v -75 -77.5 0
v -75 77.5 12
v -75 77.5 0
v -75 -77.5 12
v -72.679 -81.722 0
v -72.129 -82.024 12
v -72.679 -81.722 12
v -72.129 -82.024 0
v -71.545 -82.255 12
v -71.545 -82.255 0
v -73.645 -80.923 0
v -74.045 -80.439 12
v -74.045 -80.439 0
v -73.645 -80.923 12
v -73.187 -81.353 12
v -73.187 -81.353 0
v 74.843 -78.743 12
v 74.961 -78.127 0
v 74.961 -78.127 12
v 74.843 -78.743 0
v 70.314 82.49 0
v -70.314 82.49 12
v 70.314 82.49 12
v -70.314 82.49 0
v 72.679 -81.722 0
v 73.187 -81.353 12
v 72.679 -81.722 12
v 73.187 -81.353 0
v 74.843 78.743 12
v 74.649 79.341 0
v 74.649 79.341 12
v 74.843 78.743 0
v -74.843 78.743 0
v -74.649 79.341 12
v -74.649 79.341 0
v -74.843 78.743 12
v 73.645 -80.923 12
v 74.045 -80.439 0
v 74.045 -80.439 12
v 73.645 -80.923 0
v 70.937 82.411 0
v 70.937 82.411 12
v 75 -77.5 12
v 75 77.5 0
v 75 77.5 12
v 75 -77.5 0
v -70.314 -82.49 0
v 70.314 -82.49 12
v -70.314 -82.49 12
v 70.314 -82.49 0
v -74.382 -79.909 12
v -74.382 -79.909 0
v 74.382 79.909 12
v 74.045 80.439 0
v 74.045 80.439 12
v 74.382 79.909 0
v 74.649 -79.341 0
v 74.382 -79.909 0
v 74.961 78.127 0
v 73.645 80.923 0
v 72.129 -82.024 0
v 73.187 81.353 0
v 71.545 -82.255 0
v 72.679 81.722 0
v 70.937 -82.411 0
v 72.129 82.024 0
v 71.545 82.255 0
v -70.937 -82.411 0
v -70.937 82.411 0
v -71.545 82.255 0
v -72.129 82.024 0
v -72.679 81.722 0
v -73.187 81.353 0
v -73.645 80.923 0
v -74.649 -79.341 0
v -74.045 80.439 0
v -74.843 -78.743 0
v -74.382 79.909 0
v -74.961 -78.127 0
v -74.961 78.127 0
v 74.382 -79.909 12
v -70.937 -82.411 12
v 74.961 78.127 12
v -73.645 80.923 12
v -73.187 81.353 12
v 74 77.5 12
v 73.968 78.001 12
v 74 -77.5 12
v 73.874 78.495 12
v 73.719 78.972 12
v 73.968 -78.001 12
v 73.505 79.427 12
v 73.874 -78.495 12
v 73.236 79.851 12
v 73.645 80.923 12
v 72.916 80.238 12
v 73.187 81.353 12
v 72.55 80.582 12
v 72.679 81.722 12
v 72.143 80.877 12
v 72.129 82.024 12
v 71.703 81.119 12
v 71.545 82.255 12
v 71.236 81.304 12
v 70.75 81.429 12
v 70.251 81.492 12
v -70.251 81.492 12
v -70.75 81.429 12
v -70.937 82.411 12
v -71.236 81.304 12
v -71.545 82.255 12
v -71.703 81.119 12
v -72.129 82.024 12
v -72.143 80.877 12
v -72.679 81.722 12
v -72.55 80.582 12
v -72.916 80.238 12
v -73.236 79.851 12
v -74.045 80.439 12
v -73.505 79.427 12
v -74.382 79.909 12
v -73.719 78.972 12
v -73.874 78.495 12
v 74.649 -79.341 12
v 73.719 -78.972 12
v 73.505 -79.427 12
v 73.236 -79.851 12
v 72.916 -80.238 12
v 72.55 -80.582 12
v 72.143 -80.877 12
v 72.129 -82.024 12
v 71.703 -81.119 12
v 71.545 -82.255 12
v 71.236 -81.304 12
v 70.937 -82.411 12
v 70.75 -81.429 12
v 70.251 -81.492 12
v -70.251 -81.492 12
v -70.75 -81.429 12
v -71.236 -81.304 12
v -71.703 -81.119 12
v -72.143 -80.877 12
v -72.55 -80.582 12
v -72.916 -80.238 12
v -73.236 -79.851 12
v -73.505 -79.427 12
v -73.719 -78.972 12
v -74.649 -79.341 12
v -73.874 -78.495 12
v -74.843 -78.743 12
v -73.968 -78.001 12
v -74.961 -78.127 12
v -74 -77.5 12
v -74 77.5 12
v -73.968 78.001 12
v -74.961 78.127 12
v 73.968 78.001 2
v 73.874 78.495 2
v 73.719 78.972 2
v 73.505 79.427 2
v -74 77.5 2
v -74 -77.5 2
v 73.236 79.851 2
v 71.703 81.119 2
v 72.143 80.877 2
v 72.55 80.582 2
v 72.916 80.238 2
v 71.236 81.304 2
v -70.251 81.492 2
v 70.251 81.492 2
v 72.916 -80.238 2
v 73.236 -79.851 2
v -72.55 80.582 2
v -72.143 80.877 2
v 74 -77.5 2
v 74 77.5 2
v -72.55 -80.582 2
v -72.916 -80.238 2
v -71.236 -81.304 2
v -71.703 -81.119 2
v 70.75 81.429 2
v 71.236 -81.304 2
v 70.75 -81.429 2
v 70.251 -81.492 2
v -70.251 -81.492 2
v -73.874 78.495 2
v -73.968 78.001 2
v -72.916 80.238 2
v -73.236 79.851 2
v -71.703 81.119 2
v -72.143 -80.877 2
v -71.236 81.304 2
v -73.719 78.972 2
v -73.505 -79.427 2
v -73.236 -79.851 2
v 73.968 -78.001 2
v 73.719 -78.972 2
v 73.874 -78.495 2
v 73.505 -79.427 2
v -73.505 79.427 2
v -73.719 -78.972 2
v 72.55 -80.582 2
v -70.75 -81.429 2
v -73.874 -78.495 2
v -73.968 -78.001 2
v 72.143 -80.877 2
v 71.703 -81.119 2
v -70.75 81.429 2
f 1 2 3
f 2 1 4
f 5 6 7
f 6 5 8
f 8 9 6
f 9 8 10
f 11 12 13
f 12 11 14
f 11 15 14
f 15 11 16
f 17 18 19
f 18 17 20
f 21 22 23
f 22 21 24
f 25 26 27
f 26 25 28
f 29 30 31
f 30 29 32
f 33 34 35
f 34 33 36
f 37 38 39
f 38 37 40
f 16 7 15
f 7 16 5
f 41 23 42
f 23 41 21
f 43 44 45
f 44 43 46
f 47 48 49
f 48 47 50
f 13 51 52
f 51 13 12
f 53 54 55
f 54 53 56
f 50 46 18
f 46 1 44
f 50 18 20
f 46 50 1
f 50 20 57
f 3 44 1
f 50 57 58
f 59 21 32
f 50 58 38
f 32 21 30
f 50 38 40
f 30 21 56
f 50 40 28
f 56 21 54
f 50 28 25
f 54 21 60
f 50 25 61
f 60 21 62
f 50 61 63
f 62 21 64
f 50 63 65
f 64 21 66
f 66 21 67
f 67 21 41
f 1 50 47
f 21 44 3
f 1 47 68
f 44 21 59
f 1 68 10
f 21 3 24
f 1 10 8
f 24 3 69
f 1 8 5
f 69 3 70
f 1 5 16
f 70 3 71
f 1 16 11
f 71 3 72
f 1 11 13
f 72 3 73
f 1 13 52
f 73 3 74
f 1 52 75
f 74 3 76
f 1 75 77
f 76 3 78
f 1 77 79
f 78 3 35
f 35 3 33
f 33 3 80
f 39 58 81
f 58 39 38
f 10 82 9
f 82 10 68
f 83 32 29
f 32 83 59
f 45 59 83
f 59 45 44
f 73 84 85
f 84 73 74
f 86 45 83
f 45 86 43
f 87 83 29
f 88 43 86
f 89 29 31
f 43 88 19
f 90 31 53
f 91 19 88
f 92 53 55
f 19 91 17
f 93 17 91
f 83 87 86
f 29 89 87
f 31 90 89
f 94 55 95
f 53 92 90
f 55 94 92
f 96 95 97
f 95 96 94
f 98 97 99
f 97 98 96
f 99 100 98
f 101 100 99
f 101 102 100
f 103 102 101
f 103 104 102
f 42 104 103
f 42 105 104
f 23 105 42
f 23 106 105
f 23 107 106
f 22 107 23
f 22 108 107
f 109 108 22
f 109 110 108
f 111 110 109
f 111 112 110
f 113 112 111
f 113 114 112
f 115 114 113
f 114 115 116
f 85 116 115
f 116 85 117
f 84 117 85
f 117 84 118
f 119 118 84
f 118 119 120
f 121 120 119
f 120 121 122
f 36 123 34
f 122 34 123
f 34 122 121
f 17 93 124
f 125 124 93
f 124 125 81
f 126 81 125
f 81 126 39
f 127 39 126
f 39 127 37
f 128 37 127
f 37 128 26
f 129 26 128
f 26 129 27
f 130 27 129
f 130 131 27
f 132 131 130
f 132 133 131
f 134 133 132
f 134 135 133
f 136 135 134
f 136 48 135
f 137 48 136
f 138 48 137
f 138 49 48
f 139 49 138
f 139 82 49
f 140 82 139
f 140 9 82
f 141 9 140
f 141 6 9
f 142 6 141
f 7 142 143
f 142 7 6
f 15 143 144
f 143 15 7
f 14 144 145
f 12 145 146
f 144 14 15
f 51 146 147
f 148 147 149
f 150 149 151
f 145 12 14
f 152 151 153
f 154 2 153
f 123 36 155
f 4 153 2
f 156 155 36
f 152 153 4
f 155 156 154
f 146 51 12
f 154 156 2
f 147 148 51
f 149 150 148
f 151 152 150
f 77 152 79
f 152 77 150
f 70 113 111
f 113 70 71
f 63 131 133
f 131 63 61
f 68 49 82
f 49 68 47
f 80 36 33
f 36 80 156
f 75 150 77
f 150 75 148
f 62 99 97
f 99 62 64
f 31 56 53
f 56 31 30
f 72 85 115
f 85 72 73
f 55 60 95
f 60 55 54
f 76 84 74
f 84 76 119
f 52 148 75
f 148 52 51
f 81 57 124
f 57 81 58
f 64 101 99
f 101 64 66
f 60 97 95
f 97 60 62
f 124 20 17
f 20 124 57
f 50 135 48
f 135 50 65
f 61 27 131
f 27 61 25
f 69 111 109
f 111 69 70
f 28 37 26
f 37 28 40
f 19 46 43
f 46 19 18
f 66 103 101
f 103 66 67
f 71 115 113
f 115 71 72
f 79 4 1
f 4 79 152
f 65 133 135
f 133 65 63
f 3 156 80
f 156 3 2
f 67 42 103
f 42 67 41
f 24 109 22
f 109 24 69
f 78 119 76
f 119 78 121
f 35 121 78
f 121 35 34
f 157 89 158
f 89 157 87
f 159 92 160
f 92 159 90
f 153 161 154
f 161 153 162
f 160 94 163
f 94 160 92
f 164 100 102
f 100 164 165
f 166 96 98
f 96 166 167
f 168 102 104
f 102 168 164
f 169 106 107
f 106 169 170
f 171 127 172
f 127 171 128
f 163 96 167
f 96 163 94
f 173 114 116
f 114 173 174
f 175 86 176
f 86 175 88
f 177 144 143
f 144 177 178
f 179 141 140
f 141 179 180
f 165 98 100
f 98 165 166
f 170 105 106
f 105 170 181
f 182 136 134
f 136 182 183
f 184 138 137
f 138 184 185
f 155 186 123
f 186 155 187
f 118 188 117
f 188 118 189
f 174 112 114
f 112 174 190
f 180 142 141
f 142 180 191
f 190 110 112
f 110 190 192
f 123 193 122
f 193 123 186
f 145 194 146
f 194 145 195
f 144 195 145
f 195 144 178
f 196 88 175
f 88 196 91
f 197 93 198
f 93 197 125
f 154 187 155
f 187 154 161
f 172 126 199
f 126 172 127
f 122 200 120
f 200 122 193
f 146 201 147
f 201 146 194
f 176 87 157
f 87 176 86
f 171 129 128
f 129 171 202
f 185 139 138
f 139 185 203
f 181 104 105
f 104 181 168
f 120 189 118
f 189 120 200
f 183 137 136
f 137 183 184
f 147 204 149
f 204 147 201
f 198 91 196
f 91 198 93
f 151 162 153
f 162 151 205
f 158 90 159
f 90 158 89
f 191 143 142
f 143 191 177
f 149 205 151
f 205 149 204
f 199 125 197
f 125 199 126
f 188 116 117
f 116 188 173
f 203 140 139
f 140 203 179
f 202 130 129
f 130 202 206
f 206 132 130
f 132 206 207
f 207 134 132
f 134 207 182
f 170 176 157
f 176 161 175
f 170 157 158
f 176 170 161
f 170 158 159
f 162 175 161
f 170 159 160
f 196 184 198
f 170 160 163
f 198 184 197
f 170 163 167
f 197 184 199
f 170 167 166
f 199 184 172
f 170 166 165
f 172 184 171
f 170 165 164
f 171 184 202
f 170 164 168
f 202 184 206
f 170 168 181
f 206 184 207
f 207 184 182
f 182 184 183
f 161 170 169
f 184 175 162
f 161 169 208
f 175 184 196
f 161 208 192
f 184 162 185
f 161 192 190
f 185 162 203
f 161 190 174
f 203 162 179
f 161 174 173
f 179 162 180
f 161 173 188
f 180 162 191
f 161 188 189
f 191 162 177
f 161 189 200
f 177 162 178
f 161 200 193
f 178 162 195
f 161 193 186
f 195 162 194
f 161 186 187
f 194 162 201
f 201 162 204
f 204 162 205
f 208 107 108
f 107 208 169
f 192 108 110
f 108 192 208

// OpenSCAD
$fn = 50;


difference() {
	union() {
		hull() {
			translate(v = [-70.0000000000, 77.5000000000, 0]) {
				cylinder(h = 12, r = 5);
			}
			translate(v = [70.0000000000, 77.5000000000, 0]) {
				cylinder(h = 12, r = 5);
			}
			translate(v = [-70.0000000000, -77.5000000000, 0]) {
				cylinder(h = 12, r = 5);
			}
			translate(v = [70.0000000000, -77.5000000000, 0]) {
				cylinder(h = 12, r = 5);
			}
		}
	}
	union() {
		translate(v = [0, 0, 2]) {
			hull() {
				translate(v = [-70.0000000000, 77.5000000000, 0]) {
					cylinder(h = 10, r = 4);
				}
				translate(v = [70.0000000000, 77.5000000000, 0]) {
					cylinder(h = 10, r = 4);
				}
				translate(v = [-70.0000000000, -77.5000000000, 0]) {
					cylinder(h = 10, r = 4);
				}
				translate(v = [70.0000000000, -77.5000000000, 0]) {
					cylinder(h = 10, r = 4);
				}
			}
		}
	}
}
